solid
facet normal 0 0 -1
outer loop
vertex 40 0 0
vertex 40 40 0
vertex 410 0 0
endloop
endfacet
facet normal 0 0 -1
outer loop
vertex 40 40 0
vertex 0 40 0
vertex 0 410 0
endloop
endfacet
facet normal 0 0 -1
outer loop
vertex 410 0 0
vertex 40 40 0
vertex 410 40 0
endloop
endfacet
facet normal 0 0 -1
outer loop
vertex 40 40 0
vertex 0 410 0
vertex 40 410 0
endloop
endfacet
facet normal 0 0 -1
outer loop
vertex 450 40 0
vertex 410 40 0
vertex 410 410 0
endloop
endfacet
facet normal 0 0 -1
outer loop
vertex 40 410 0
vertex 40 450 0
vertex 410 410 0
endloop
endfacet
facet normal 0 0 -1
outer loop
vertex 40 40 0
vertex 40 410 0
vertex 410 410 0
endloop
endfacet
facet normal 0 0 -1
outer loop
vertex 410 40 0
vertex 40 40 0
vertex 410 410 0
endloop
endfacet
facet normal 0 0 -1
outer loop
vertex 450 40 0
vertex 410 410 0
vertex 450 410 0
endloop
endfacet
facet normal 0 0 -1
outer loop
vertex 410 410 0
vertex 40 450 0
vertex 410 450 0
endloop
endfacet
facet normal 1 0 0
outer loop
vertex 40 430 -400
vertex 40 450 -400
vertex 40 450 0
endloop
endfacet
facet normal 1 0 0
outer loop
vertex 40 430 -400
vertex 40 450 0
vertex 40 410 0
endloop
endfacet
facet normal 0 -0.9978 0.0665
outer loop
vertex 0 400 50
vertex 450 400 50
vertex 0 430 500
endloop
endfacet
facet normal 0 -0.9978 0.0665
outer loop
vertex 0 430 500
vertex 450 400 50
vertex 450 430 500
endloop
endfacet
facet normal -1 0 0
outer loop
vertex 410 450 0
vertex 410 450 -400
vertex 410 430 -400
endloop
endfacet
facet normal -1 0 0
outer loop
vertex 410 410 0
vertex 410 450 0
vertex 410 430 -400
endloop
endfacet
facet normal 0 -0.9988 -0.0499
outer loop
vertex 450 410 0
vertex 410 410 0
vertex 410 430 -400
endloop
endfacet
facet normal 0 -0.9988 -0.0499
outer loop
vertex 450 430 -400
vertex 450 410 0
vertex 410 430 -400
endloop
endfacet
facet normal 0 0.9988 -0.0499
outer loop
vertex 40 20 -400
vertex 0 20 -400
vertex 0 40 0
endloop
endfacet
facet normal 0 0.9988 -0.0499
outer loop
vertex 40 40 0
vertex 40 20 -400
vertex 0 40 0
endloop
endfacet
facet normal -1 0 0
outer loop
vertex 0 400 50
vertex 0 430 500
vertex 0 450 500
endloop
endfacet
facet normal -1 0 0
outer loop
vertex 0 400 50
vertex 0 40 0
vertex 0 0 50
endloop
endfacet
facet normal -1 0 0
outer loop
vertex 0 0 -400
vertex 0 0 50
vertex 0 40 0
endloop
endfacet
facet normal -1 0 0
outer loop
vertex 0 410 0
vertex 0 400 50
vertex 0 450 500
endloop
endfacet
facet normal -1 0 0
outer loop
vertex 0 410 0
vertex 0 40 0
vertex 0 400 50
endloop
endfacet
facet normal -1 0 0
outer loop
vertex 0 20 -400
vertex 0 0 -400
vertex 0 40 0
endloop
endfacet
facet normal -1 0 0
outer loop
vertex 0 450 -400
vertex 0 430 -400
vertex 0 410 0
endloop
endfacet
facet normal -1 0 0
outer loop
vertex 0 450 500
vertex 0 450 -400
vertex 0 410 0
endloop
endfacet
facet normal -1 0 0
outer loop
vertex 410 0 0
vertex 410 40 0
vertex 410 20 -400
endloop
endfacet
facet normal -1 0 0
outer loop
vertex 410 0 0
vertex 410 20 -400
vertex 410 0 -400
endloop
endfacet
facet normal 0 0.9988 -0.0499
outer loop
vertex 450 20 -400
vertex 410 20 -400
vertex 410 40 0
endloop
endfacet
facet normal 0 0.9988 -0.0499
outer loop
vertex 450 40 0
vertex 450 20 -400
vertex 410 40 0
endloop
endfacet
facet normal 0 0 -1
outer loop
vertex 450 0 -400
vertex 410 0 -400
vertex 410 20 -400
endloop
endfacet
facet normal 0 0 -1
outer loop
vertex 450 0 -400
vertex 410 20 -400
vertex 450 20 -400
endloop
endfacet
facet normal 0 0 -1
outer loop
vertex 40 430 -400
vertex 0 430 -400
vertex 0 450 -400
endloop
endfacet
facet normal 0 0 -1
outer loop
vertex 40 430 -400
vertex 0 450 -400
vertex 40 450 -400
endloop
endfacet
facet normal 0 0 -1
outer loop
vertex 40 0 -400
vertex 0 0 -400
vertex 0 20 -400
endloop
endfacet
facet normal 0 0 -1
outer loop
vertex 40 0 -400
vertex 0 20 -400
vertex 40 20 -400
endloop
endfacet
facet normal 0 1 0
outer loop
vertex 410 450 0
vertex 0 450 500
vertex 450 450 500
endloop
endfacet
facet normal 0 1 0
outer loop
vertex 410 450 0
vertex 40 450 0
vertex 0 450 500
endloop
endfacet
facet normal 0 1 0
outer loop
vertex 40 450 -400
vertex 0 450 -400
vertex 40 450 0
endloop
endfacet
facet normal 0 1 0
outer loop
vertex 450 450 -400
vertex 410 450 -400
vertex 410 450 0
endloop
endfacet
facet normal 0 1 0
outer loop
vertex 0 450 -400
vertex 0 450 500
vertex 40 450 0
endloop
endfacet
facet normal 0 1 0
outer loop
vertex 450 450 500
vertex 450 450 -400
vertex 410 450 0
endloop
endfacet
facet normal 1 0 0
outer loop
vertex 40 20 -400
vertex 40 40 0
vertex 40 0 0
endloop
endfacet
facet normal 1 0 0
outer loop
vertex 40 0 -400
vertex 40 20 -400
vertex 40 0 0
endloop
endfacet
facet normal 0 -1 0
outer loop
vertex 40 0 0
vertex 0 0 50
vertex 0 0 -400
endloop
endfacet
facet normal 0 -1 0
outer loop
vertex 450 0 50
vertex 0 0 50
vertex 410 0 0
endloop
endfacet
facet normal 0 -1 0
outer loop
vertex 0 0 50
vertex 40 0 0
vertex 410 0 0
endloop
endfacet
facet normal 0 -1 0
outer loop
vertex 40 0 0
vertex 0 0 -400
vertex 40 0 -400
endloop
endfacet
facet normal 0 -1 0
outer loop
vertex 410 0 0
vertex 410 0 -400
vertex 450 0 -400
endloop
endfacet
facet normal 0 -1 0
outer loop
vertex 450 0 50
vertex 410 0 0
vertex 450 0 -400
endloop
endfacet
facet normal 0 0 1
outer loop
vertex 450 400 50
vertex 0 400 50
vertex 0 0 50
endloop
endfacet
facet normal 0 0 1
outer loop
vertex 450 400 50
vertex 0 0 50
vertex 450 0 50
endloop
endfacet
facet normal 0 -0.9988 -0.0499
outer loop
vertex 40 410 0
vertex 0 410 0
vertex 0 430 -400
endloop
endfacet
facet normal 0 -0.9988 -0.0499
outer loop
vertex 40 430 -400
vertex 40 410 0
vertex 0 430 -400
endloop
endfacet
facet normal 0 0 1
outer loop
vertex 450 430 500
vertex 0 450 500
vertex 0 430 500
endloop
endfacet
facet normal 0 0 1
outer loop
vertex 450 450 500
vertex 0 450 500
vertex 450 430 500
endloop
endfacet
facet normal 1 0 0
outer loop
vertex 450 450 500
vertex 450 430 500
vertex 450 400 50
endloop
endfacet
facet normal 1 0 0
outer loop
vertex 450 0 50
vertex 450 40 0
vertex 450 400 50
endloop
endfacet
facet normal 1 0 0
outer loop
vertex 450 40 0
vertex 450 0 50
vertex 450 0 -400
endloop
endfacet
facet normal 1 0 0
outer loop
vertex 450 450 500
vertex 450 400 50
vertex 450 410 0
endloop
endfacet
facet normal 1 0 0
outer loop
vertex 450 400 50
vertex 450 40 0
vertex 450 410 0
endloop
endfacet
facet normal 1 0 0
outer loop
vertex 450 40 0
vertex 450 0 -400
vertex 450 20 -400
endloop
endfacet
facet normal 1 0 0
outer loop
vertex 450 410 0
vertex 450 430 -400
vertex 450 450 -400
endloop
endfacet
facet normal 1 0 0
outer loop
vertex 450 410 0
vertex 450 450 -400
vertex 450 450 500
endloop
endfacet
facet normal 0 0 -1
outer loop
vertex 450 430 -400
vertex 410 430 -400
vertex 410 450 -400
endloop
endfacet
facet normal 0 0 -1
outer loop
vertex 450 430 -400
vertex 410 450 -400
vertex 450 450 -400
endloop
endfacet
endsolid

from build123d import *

# Parameters (mm, degrees)
F0_W      = 450
F0_H      = 450
F1_DEPTH  = 50
F2_W      = 40
F2_H      = 40
F3_DEPTH  = 400
F4_W      = 40
F4_H      = 40
F5_DEPTH  = 400
F6_W      = 40
F6_H      = 40
F7_DEPTH  = 400
F8_W      = 40
F8_H      = 40
F9_DEPTH  = 400
F10_W     = 450
F10_H     = 50
F11_DEPTH = 450
F13_DEPTH = 450
F15_DEPTH = 450.001
F17_DEPTH = 450.001
F18_DEPTH = 100
F19_DEPTH = 100
F20_DEPTH = 200
F21_DEPTH = 200


with BuildPart() as f1:
    # F0 (on Top) → F1 (new body)
    with BuildSketch(Plane.XY):
        with Locations((225, 225)):
            Rectangle(F0_W, F0_H)
    extrude(amount=F1_DEPTH)

    # F2 (on face) → F3 (join)
    with BuildSketch(Plane(origin=(0, 0, 0), x_dir=(1, 0, 0), z_dir=(0, 0, -1))):
        with Locations((20, -430)):
            Rectangle(F2_W, F2_H)
    extrude(amount=F3_DEPTH)

    # F4 (on face) → F5 (join)
    with BuildSketch(Plane(origin=(0, 0, 0), x_dir=(1, 0, 0), z_dir=(0, 0, -1))):
        with Locations((20, -20)):
            Rectangle(F4_W, F4_H)
    extrude(amount=F5_DEPTH)

    # F6 (on face) → F7 (join)
    with BuildSketch(Plane(origin=(0, 0, 0), x_dir=(1, 0, 0), z_dir=(0, 0, -1))):
        with Locations((430, -430)):
            Rectangle(F6_W, F6_H)
    extrude(amount=F7_DEPTH)

    # F8 (on face) → F9 (join)
    with BuildSketch(Plane(origin=(0, 0, 0), x_dir=(1, 0, 0), z_dir=(0, 0, -1))):
        with Locations((430, -20)):
            Rectangle(F8_W, F8_H)
    extrude(amount=F9_DEPTH)

    # F10 (on face) → F11 (join)
    with BuildSketch(Plane.XY.offset(50)):
        with Locations((225, 425)):
            Rectangle(F10_W, F10_H)
    extrude(amount=F11_DEPTH)

    # F12 (on face) → F13 (cut)
    with BuildSketch(Plane.YZ.offset(450)):
        Polygon((400, 500), (400, 50), (430, 500), align=None)
    extrude(amount=-F13_DEPTH, mode=Mode.SUBTRACT)

    # F14 (on face) → F15 (cut, through all)
    with BuildSketch(Plane(origin=(0, 0, 0), x_dir=(0, -1, 0), z_dir=(-1, 0, 0))):
        Polygon((-410, -400), (-410, 0), (-430, -400), align=None)
    extrude(amount=-F15_DEPTH, mode=Mode.SUBTRACT)

    # F16 (on face) → F17 (cut, through all)
    with BuildSketch(Plane(origin=(0, 0, 0), x_dir=(0, -1, 0), z_dir=(-1, 0, 0))):
        Polygon((-20, -400), (-40, 0), (-40, -400), align=None)
    extrude(amount=-F17_DEPTH, mode=Mode.SUBTRACT)

    # F18 (add): a face of the model
    f18_faces = [f1.faces().sort_by_distance(p)[0] for p in [
        (225, 200, 50),
    ]]
    extrude(f18_faces, amount=F18_DEPTH)

    # F19 (cut): a face of the model
    f19_faces = [f1.faces().sort_by_distance(p)[0] for p in [
        (225, 200, 150),
    ]]
    extrude(f19_faces, amount=-F19_DEPTH, mode=Mode.SUBTRACT)

    # F20 (add): a face of the model
    f20_faces = [f1.faces().sort_by_distance(p)[0] for p in [
        (225, 200, 50),
    ]]
    extrude(f20_faces, amount=F20_DEPTH)

    # F21 (cut): a face of the model
    f21_faces = [f1.faces().sort_by_distance(p)[0] for p in [
        (225, 200, 250),
    ]]
    extrude(f21_faces, amount=-F21_DEPTH, mode=Mode.SUBTRACT)


solid = f1.part
